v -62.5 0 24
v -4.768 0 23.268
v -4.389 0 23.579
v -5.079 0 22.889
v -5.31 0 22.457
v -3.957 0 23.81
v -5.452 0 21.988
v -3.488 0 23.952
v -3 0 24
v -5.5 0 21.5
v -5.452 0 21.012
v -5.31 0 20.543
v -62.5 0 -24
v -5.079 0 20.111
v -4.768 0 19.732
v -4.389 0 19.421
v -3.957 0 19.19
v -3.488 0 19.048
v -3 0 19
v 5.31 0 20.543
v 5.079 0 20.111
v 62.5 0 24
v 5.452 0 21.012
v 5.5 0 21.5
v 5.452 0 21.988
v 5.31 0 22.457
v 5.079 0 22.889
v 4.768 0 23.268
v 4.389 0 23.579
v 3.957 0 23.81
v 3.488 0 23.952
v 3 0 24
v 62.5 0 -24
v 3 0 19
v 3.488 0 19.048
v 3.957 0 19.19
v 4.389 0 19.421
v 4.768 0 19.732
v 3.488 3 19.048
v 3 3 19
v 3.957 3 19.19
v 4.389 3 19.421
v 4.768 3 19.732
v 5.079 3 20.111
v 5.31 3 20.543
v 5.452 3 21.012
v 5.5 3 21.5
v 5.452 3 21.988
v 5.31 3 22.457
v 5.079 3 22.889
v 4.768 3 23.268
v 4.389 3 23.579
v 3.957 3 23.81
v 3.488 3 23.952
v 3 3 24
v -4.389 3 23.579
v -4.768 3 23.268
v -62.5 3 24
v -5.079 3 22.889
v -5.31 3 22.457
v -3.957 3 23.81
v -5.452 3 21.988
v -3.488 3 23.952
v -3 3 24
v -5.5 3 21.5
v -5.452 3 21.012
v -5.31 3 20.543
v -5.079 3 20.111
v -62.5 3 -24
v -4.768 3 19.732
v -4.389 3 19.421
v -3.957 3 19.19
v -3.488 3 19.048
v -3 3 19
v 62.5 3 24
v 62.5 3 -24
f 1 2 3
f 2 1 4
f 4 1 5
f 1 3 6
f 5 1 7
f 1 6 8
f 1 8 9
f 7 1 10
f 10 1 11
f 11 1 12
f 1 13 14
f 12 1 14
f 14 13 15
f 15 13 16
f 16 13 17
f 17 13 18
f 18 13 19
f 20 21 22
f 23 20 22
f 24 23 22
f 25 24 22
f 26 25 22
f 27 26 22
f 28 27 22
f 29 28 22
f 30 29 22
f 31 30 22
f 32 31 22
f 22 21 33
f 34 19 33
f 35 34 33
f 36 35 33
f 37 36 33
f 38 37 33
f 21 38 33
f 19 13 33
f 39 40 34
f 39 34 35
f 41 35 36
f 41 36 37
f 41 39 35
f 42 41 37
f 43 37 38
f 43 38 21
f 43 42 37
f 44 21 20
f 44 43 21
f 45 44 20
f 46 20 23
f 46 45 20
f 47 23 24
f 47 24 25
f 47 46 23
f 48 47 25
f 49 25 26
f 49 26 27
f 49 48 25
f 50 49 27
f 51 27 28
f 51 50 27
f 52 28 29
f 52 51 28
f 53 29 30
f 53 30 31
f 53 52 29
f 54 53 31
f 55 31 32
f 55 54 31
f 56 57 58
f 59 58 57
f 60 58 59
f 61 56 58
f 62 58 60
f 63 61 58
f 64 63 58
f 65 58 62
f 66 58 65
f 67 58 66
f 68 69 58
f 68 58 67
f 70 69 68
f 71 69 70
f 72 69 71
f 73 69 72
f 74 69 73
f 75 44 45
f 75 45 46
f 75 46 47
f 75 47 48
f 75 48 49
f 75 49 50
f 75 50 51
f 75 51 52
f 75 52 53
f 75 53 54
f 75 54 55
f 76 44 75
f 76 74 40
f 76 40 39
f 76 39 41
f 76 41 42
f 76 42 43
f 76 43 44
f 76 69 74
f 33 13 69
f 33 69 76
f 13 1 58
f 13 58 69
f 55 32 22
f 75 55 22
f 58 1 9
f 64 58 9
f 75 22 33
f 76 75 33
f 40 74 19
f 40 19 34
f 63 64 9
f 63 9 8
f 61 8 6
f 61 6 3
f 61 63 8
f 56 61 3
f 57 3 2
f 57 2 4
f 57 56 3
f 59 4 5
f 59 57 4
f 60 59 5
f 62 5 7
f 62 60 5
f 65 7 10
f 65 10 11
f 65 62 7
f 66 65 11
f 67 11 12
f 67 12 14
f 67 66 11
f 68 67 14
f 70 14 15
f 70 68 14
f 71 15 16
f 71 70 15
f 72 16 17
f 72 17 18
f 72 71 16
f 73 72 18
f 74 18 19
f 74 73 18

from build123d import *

# Parameters (mm, degrees)
SKETCH1_W           = 125
SKETCH1_H           = 48
BOSS_EXTRUDE1_DEPTH = 3
CUT_EXTRUDE1_DEPTH  = 3


with BuildPart() as part:
    # Sketch1 → Boss-Extrude1 (new body)
    with BuildSketch(Plane(origin=(0, 0, 0), x_dir=(1, 0, 0), z_dir=(0, 1, 0))):
        Rectangle(SKETCH1_W, SKETCH1_H)
    extrude(amount=BOSS_EXTRUDE1_DEPTH)

    # Sketch2 → Cut-Extrude1 (cut)
    with BuildSketch(Plane(origin=(0, 3, 0), x_dir=(1, 0, 0), z_dir=(0, 1, 0))):
        with BuildLine():
            Line((0, -19), (3, -19))
            ThreePointArc((3, -19), (5.5, -21.5), (3, -24))
            Line((3, -24), (-3, -24))
            ThreePointArc((-3, -24), (-5.5, -21.5), (-3, -19))
            Line((-3, -19), (0, -19))
        make_face()
    extrude(amount=-CUT_EXTRUDE1_DEPTH, mode=Mode.SUBTRACT)


solid = part.part
